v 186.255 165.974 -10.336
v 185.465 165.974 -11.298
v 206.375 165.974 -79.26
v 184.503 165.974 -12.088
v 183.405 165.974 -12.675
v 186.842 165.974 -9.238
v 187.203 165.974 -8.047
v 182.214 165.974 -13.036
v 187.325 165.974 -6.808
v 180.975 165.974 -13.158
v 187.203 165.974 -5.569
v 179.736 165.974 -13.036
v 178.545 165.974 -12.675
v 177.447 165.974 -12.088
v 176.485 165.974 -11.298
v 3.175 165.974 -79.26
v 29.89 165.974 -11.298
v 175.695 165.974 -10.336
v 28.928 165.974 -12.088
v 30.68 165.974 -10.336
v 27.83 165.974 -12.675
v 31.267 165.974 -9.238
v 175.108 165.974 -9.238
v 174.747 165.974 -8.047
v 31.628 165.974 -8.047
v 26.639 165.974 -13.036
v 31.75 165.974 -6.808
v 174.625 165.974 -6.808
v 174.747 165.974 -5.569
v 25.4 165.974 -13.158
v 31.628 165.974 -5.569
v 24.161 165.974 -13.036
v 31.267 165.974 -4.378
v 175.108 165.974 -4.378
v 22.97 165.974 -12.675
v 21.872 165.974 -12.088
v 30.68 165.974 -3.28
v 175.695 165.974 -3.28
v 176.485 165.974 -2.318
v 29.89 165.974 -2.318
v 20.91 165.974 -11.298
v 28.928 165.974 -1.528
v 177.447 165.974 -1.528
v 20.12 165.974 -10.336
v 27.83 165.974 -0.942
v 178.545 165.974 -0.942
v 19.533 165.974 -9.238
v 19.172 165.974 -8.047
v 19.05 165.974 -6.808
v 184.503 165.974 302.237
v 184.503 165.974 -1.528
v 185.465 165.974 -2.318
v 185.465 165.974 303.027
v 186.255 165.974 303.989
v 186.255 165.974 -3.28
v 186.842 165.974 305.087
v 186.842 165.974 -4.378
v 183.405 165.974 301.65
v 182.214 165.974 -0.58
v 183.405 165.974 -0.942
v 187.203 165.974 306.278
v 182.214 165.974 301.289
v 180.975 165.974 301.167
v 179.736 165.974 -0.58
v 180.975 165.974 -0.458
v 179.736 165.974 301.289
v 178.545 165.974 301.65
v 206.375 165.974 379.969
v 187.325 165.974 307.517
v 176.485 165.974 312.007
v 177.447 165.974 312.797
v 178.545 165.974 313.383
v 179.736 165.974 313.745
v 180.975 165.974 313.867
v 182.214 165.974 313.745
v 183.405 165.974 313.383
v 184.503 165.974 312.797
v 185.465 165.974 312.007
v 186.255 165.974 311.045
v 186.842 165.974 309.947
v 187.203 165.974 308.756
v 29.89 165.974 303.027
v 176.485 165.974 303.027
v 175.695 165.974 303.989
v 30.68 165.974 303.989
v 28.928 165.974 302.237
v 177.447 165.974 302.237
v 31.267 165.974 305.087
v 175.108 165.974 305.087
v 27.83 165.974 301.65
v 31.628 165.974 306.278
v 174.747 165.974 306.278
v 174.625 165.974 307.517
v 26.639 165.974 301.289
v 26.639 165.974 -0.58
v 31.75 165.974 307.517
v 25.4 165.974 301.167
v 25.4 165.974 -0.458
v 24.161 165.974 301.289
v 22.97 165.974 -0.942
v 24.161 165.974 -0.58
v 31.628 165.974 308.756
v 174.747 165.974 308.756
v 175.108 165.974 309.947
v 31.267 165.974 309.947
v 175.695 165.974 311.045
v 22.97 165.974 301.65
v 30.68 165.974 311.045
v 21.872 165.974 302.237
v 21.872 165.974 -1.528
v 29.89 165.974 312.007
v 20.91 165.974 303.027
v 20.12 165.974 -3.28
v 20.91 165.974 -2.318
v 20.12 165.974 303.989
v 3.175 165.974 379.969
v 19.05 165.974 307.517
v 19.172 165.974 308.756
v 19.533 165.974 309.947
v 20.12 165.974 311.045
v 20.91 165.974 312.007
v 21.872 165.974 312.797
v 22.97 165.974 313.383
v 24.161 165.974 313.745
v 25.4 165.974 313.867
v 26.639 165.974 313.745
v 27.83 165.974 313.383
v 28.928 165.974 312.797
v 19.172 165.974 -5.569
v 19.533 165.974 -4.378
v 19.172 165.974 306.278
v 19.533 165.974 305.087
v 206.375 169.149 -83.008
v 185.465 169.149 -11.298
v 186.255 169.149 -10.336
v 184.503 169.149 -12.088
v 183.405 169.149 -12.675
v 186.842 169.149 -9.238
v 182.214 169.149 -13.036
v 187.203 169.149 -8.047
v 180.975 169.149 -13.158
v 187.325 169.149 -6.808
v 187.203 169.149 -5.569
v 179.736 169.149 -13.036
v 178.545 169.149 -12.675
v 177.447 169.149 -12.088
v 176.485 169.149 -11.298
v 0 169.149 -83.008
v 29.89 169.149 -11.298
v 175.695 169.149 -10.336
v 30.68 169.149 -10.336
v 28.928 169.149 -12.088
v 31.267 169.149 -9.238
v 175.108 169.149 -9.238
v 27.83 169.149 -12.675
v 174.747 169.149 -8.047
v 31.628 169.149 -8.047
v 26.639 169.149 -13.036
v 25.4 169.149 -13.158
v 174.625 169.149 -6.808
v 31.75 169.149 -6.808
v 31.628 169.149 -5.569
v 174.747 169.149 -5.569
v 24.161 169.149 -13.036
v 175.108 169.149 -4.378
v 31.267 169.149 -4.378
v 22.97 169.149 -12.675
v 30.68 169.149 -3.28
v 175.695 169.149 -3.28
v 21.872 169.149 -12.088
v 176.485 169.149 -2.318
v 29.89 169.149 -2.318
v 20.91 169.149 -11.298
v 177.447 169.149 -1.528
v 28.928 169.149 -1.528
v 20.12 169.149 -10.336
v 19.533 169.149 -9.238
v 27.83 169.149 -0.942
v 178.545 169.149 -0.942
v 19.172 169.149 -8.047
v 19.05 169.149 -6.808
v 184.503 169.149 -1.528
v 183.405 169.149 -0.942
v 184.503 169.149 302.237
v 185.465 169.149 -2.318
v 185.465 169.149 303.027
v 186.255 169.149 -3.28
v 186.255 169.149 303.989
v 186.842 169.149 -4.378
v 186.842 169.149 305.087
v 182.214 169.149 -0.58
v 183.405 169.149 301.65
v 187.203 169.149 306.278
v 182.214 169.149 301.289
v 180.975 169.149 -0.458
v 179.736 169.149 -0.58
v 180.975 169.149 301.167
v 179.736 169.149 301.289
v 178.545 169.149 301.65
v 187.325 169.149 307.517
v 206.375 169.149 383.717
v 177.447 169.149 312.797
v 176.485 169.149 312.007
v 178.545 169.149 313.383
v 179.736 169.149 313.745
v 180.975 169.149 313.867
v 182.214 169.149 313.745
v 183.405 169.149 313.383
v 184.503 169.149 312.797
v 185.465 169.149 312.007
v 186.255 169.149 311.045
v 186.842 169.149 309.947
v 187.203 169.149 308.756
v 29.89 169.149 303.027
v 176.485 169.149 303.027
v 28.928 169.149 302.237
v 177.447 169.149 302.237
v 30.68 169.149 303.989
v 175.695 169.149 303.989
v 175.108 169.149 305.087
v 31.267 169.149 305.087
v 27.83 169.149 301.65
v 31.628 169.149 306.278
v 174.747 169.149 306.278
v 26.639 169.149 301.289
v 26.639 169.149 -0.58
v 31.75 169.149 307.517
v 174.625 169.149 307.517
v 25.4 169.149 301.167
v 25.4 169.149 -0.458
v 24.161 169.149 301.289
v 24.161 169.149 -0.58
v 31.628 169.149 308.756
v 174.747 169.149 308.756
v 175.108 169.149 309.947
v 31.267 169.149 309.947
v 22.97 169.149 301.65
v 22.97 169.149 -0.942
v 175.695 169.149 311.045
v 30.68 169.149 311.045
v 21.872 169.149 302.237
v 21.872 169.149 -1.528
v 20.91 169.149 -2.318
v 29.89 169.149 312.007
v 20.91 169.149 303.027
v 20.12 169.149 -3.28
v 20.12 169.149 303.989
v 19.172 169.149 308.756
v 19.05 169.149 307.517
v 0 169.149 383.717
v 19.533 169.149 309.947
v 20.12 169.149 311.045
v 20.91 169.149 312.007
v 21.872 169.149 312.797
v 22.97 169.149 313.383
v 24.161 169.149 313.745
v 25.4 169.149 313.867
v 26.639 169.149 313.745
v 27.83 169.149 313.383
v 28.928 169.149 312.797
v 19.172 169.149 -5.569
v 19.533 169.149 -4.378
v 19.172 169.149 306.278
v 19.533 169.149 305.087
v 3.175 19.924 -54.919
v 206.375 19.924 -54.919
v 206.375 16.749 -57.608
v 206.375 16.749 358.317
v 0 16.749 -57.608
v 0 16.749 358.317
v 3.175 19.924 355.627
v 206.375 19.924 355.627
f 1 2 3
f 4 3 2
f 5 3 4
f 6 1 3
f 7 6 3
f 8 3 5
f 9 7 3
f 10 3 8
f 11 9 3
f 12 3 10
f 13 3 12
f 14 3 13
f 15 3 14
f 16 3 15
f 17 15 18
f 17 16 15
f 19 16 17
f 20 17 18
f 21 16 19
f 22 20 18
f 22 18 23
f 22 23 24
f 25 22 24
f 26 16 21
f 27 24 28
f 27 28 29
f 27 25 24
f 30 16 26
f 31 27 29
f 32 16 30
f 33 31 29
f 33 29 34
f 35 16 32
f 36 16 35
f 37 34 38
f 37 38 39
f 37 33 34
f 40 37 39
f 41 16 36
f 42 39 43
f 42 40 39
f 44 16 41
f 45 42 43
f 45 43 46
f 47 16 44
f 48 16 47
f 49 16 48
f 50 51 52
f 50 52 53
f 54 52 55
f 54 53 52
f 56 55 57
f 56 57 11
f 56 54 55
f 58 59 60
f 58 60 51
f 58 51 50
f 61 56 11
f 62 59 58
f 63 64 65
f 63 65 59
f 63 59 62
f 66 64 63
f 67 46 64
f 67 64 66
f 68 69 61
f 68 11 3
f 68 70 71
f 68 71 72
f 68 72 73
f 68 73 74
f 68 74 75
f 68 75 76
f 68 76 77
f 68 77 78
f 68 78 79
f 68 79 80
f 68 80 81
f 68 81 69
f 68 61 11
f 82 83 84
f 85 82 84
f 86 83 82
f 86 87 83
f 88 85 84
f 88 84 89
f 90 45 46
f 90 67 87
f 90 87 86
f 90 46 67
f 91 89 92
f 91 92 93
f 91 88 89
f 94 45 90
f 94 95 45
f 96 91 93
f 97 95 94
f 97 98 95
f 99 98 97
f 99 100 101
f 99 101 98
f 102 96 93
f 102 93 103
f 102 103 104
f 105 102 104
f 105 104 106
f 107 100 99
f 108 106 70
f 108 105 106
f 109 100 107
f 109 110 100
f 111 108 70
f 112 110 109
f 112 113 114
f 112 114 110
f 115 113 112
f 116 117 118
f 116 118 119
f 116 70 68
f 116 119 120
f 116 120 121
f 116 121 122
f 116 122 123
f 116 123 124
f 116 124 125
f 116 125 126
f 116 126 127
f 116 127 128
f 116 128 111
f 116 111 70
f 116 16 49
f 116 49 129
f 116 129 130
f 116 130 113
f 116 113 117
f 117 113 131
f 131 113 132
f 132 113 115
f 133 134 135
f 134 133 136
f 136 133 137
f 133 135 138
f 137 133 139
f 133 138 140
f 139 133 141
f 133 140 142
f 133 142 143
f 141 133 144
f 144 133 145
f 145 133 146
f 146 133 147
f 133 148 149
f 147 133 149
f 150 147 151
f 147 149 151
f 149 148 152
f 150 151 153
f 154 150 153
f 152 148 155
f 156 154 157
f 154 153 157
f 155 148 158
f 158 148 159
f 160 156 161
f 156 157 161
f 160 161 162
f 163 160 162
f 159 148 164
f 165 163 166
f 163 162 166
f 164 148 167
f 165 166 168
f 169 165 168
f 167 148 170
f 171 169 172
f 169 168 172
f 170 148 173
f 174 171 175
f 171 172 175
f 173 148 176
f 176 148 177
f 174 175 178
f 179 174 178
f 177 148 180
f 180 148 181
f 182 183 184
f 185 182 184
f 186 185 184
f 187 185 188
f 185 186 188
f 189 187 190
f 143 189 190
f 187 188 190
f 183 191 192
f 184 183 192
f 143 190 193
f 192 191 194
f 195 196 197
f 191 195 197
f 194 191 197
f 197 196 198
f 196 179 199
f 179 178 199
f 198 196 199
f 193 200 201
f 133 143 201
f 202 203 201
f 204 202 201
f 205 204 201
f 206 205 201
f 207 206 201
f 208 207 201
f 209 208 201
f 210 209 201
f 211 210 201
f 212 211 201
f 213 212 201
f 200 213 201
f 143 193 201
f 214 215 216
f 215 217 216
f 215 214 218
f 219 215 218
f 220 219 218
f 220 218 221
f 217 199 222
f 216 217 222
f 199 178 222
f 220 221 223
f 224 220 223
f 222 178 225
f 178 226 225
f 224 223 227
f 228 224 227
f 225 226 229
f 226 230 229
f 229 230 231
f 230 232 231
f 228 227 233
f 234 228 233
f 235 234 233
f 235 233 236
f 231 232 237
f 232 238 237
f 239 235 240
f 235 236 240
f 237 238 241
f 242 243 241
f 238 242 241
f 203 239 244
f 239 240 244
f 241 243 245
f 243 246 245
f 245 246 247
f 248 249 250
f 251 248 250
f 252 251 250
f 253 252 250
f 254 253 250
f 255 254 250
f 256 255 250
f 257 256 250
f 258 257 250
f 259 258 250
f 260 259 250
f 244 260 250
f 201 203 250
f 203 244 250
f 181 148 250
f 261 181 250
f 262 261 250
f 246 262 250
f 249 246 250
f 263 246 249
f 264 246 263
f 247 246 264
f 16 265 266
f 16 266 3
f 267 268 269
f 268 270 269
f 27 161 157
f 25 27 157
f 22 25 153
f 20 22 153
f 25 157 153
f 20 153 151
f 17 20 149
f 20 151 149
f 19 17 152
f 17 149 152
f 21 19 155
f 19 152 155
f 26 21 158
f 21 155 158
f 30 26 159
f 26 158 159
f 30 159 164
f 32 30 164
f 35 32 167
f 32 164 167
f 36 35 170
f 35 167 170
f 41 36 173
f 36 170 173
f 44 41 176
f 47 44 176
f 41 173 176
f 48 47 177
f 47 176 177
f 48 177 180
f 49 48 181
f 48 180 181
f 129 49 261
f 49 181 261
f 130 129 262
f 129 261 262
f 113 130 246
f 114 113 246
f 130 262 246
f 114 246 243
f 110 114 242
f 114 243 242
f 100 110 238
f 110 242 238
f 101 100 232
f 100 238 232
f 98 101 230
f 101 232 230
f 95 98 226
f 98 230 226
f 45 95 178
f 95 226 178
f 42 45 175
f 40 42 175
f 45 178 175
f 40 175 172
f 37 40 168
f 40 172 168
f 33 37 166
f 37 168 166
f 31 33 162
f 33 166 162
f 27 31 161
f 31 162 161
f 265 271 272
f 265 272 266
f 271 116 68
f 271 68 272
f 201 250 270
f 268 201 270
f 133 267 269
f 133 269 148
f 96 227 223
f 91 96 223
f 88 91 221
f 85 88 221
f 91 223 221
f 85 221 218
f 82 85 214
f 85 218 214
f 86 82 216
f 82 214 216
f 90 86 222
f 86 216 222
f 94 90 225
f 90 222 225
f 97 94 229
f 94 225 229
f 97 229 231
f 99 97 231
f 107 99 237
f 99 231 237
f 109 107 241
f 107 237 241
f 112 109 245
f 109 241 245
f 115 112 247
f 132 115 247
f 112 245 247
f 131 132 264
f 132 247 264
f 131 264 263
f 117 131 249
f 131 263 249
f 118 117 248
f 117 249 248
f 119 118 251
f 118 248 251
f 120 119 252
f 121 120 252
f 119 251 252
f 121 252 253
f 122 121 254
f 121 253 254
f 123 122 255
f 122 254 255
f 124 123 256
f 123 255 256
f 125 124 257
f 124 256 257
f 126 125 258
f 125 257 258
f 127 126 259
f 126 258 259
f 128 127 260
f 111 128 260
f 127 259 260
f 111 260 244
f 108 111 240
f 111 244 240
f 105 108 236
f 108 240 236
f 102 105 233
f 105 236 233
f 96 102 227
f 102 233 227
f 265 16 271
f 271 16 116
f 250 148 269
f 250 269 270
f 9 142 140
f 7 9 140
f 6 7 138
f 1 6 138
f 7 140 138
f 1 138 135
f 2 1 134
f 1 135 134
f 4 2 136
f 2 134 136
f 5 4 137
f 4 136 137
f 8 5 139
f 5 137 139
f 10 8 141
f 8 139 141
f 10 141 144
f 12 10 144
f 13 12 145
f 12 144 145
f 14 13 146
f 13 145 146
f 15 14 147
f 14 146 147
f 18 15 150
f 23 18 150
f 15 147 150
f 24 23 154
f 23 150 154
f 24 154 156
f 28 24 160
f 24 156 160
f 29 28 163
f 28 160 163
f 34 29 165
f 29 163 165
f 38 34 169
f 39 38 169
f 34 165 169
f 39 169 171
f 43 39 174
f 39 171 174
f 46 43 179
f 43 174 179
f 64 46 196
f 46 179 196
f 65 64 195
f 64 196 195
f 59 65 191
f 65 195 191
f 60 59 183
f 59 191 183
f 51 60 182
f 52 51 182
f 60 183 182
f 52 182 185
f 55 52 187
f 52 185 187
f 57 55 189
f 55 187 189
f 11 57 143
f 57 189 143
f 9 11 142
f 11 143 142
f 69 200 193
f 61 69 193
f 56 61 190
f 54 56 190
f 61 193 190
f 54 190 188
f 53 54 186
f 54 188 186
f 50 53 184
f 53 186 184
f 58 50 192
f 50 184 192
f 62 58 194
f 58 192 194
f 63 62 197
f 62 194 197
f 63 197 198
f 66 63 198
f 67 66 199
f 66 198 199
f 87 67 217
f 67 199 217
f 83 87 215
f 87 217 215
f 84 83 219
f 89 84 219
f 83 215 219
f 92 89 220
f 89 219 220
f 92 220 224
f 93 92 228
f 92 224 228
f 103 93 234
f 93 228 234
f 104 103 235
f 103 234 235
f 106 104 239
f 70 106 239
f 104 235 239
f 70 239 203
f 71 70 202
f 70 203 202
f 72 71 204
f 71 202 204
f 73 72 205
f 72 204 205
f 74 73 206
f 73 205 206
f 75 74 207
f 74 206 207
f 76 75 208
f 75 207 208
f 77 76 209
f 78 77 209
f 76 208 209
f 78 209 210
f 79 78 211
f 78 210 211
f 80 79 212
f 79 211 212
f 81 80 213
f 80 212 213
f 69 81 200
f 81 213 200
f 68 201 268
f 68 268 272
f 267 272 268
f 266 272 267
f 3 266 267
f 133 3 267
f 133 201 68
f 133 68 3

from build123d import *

# Parameters (mm, degrees)
BOSS_EXTRUDE1_DEPTH = 3.175
BOSS_EXTRUDE2_DEPTH = 203.2
SKETCH3_R           = 6.35
CUT_EXTRUDE1_DEPTH  = 3.175


with BuildPart() as part:
    # Sketch1 → Boss-Extrude1 (new body)
    with BuildSketch(Plane(origin=(0, 0, 0), x_dir=(0, 0, -1), z_dir=(1, 0, 0))):
        Polygon((-358.316862416, 16.748657718), (-383.716862416, 169.148657718), (83.008137584, 169.148657718), (57.608137584, 16.748657718), align=None)
    extrude(amount=BOSS_EXTRUDE1_DEPTH)

    # Sketch2 → Boss-Extrude2 (add)
    with BuildSketch(Plane(origin=(3.175, 0, 0), x_dir=(0, 0, -1), z_dir=(1, 0, 0))):
        Polygon((-383.716862416, 169.148657718), (-358.316862416, 16.748657718), (57.608137584, 16.748657718), (83.008137584, 169.148657718), align=None)
        Polygon((54.918509078, 19.923657718), (79.260175745, 165.973657718), (-379.968900577, 165.973657718), (-355.62723391, 19.923657718), align=None, mode=Mode.SUBTRACT)
    extrude(amount=BOSS_EXTRUDE2_DEPTH)

    # Sketch3 → Cut-Extrude1 (cut)
    with BuildSketch(Plane(origin=(0, 169.148657718, 0), x_dir=(1, 0, 0), z_dir=(0, 1, 0))):
        with Locations((180.975, 6.808137584)):
            Circle(SKETCH3_R)
        with Locations((25.4, 6.808137584)):
            Circle(SKETCH3_R)
        with Locations((25.4, -307.516862416)):
            Circle(SKETCH3_R)
        with Locations((180.975, -307.516862416)):
            Circle(SKETCH3_R)
    extrude(amount=-CUT_EXTRUDE1_DEPTH, mode=Mode.SUBTRACT)


solid = part.part
